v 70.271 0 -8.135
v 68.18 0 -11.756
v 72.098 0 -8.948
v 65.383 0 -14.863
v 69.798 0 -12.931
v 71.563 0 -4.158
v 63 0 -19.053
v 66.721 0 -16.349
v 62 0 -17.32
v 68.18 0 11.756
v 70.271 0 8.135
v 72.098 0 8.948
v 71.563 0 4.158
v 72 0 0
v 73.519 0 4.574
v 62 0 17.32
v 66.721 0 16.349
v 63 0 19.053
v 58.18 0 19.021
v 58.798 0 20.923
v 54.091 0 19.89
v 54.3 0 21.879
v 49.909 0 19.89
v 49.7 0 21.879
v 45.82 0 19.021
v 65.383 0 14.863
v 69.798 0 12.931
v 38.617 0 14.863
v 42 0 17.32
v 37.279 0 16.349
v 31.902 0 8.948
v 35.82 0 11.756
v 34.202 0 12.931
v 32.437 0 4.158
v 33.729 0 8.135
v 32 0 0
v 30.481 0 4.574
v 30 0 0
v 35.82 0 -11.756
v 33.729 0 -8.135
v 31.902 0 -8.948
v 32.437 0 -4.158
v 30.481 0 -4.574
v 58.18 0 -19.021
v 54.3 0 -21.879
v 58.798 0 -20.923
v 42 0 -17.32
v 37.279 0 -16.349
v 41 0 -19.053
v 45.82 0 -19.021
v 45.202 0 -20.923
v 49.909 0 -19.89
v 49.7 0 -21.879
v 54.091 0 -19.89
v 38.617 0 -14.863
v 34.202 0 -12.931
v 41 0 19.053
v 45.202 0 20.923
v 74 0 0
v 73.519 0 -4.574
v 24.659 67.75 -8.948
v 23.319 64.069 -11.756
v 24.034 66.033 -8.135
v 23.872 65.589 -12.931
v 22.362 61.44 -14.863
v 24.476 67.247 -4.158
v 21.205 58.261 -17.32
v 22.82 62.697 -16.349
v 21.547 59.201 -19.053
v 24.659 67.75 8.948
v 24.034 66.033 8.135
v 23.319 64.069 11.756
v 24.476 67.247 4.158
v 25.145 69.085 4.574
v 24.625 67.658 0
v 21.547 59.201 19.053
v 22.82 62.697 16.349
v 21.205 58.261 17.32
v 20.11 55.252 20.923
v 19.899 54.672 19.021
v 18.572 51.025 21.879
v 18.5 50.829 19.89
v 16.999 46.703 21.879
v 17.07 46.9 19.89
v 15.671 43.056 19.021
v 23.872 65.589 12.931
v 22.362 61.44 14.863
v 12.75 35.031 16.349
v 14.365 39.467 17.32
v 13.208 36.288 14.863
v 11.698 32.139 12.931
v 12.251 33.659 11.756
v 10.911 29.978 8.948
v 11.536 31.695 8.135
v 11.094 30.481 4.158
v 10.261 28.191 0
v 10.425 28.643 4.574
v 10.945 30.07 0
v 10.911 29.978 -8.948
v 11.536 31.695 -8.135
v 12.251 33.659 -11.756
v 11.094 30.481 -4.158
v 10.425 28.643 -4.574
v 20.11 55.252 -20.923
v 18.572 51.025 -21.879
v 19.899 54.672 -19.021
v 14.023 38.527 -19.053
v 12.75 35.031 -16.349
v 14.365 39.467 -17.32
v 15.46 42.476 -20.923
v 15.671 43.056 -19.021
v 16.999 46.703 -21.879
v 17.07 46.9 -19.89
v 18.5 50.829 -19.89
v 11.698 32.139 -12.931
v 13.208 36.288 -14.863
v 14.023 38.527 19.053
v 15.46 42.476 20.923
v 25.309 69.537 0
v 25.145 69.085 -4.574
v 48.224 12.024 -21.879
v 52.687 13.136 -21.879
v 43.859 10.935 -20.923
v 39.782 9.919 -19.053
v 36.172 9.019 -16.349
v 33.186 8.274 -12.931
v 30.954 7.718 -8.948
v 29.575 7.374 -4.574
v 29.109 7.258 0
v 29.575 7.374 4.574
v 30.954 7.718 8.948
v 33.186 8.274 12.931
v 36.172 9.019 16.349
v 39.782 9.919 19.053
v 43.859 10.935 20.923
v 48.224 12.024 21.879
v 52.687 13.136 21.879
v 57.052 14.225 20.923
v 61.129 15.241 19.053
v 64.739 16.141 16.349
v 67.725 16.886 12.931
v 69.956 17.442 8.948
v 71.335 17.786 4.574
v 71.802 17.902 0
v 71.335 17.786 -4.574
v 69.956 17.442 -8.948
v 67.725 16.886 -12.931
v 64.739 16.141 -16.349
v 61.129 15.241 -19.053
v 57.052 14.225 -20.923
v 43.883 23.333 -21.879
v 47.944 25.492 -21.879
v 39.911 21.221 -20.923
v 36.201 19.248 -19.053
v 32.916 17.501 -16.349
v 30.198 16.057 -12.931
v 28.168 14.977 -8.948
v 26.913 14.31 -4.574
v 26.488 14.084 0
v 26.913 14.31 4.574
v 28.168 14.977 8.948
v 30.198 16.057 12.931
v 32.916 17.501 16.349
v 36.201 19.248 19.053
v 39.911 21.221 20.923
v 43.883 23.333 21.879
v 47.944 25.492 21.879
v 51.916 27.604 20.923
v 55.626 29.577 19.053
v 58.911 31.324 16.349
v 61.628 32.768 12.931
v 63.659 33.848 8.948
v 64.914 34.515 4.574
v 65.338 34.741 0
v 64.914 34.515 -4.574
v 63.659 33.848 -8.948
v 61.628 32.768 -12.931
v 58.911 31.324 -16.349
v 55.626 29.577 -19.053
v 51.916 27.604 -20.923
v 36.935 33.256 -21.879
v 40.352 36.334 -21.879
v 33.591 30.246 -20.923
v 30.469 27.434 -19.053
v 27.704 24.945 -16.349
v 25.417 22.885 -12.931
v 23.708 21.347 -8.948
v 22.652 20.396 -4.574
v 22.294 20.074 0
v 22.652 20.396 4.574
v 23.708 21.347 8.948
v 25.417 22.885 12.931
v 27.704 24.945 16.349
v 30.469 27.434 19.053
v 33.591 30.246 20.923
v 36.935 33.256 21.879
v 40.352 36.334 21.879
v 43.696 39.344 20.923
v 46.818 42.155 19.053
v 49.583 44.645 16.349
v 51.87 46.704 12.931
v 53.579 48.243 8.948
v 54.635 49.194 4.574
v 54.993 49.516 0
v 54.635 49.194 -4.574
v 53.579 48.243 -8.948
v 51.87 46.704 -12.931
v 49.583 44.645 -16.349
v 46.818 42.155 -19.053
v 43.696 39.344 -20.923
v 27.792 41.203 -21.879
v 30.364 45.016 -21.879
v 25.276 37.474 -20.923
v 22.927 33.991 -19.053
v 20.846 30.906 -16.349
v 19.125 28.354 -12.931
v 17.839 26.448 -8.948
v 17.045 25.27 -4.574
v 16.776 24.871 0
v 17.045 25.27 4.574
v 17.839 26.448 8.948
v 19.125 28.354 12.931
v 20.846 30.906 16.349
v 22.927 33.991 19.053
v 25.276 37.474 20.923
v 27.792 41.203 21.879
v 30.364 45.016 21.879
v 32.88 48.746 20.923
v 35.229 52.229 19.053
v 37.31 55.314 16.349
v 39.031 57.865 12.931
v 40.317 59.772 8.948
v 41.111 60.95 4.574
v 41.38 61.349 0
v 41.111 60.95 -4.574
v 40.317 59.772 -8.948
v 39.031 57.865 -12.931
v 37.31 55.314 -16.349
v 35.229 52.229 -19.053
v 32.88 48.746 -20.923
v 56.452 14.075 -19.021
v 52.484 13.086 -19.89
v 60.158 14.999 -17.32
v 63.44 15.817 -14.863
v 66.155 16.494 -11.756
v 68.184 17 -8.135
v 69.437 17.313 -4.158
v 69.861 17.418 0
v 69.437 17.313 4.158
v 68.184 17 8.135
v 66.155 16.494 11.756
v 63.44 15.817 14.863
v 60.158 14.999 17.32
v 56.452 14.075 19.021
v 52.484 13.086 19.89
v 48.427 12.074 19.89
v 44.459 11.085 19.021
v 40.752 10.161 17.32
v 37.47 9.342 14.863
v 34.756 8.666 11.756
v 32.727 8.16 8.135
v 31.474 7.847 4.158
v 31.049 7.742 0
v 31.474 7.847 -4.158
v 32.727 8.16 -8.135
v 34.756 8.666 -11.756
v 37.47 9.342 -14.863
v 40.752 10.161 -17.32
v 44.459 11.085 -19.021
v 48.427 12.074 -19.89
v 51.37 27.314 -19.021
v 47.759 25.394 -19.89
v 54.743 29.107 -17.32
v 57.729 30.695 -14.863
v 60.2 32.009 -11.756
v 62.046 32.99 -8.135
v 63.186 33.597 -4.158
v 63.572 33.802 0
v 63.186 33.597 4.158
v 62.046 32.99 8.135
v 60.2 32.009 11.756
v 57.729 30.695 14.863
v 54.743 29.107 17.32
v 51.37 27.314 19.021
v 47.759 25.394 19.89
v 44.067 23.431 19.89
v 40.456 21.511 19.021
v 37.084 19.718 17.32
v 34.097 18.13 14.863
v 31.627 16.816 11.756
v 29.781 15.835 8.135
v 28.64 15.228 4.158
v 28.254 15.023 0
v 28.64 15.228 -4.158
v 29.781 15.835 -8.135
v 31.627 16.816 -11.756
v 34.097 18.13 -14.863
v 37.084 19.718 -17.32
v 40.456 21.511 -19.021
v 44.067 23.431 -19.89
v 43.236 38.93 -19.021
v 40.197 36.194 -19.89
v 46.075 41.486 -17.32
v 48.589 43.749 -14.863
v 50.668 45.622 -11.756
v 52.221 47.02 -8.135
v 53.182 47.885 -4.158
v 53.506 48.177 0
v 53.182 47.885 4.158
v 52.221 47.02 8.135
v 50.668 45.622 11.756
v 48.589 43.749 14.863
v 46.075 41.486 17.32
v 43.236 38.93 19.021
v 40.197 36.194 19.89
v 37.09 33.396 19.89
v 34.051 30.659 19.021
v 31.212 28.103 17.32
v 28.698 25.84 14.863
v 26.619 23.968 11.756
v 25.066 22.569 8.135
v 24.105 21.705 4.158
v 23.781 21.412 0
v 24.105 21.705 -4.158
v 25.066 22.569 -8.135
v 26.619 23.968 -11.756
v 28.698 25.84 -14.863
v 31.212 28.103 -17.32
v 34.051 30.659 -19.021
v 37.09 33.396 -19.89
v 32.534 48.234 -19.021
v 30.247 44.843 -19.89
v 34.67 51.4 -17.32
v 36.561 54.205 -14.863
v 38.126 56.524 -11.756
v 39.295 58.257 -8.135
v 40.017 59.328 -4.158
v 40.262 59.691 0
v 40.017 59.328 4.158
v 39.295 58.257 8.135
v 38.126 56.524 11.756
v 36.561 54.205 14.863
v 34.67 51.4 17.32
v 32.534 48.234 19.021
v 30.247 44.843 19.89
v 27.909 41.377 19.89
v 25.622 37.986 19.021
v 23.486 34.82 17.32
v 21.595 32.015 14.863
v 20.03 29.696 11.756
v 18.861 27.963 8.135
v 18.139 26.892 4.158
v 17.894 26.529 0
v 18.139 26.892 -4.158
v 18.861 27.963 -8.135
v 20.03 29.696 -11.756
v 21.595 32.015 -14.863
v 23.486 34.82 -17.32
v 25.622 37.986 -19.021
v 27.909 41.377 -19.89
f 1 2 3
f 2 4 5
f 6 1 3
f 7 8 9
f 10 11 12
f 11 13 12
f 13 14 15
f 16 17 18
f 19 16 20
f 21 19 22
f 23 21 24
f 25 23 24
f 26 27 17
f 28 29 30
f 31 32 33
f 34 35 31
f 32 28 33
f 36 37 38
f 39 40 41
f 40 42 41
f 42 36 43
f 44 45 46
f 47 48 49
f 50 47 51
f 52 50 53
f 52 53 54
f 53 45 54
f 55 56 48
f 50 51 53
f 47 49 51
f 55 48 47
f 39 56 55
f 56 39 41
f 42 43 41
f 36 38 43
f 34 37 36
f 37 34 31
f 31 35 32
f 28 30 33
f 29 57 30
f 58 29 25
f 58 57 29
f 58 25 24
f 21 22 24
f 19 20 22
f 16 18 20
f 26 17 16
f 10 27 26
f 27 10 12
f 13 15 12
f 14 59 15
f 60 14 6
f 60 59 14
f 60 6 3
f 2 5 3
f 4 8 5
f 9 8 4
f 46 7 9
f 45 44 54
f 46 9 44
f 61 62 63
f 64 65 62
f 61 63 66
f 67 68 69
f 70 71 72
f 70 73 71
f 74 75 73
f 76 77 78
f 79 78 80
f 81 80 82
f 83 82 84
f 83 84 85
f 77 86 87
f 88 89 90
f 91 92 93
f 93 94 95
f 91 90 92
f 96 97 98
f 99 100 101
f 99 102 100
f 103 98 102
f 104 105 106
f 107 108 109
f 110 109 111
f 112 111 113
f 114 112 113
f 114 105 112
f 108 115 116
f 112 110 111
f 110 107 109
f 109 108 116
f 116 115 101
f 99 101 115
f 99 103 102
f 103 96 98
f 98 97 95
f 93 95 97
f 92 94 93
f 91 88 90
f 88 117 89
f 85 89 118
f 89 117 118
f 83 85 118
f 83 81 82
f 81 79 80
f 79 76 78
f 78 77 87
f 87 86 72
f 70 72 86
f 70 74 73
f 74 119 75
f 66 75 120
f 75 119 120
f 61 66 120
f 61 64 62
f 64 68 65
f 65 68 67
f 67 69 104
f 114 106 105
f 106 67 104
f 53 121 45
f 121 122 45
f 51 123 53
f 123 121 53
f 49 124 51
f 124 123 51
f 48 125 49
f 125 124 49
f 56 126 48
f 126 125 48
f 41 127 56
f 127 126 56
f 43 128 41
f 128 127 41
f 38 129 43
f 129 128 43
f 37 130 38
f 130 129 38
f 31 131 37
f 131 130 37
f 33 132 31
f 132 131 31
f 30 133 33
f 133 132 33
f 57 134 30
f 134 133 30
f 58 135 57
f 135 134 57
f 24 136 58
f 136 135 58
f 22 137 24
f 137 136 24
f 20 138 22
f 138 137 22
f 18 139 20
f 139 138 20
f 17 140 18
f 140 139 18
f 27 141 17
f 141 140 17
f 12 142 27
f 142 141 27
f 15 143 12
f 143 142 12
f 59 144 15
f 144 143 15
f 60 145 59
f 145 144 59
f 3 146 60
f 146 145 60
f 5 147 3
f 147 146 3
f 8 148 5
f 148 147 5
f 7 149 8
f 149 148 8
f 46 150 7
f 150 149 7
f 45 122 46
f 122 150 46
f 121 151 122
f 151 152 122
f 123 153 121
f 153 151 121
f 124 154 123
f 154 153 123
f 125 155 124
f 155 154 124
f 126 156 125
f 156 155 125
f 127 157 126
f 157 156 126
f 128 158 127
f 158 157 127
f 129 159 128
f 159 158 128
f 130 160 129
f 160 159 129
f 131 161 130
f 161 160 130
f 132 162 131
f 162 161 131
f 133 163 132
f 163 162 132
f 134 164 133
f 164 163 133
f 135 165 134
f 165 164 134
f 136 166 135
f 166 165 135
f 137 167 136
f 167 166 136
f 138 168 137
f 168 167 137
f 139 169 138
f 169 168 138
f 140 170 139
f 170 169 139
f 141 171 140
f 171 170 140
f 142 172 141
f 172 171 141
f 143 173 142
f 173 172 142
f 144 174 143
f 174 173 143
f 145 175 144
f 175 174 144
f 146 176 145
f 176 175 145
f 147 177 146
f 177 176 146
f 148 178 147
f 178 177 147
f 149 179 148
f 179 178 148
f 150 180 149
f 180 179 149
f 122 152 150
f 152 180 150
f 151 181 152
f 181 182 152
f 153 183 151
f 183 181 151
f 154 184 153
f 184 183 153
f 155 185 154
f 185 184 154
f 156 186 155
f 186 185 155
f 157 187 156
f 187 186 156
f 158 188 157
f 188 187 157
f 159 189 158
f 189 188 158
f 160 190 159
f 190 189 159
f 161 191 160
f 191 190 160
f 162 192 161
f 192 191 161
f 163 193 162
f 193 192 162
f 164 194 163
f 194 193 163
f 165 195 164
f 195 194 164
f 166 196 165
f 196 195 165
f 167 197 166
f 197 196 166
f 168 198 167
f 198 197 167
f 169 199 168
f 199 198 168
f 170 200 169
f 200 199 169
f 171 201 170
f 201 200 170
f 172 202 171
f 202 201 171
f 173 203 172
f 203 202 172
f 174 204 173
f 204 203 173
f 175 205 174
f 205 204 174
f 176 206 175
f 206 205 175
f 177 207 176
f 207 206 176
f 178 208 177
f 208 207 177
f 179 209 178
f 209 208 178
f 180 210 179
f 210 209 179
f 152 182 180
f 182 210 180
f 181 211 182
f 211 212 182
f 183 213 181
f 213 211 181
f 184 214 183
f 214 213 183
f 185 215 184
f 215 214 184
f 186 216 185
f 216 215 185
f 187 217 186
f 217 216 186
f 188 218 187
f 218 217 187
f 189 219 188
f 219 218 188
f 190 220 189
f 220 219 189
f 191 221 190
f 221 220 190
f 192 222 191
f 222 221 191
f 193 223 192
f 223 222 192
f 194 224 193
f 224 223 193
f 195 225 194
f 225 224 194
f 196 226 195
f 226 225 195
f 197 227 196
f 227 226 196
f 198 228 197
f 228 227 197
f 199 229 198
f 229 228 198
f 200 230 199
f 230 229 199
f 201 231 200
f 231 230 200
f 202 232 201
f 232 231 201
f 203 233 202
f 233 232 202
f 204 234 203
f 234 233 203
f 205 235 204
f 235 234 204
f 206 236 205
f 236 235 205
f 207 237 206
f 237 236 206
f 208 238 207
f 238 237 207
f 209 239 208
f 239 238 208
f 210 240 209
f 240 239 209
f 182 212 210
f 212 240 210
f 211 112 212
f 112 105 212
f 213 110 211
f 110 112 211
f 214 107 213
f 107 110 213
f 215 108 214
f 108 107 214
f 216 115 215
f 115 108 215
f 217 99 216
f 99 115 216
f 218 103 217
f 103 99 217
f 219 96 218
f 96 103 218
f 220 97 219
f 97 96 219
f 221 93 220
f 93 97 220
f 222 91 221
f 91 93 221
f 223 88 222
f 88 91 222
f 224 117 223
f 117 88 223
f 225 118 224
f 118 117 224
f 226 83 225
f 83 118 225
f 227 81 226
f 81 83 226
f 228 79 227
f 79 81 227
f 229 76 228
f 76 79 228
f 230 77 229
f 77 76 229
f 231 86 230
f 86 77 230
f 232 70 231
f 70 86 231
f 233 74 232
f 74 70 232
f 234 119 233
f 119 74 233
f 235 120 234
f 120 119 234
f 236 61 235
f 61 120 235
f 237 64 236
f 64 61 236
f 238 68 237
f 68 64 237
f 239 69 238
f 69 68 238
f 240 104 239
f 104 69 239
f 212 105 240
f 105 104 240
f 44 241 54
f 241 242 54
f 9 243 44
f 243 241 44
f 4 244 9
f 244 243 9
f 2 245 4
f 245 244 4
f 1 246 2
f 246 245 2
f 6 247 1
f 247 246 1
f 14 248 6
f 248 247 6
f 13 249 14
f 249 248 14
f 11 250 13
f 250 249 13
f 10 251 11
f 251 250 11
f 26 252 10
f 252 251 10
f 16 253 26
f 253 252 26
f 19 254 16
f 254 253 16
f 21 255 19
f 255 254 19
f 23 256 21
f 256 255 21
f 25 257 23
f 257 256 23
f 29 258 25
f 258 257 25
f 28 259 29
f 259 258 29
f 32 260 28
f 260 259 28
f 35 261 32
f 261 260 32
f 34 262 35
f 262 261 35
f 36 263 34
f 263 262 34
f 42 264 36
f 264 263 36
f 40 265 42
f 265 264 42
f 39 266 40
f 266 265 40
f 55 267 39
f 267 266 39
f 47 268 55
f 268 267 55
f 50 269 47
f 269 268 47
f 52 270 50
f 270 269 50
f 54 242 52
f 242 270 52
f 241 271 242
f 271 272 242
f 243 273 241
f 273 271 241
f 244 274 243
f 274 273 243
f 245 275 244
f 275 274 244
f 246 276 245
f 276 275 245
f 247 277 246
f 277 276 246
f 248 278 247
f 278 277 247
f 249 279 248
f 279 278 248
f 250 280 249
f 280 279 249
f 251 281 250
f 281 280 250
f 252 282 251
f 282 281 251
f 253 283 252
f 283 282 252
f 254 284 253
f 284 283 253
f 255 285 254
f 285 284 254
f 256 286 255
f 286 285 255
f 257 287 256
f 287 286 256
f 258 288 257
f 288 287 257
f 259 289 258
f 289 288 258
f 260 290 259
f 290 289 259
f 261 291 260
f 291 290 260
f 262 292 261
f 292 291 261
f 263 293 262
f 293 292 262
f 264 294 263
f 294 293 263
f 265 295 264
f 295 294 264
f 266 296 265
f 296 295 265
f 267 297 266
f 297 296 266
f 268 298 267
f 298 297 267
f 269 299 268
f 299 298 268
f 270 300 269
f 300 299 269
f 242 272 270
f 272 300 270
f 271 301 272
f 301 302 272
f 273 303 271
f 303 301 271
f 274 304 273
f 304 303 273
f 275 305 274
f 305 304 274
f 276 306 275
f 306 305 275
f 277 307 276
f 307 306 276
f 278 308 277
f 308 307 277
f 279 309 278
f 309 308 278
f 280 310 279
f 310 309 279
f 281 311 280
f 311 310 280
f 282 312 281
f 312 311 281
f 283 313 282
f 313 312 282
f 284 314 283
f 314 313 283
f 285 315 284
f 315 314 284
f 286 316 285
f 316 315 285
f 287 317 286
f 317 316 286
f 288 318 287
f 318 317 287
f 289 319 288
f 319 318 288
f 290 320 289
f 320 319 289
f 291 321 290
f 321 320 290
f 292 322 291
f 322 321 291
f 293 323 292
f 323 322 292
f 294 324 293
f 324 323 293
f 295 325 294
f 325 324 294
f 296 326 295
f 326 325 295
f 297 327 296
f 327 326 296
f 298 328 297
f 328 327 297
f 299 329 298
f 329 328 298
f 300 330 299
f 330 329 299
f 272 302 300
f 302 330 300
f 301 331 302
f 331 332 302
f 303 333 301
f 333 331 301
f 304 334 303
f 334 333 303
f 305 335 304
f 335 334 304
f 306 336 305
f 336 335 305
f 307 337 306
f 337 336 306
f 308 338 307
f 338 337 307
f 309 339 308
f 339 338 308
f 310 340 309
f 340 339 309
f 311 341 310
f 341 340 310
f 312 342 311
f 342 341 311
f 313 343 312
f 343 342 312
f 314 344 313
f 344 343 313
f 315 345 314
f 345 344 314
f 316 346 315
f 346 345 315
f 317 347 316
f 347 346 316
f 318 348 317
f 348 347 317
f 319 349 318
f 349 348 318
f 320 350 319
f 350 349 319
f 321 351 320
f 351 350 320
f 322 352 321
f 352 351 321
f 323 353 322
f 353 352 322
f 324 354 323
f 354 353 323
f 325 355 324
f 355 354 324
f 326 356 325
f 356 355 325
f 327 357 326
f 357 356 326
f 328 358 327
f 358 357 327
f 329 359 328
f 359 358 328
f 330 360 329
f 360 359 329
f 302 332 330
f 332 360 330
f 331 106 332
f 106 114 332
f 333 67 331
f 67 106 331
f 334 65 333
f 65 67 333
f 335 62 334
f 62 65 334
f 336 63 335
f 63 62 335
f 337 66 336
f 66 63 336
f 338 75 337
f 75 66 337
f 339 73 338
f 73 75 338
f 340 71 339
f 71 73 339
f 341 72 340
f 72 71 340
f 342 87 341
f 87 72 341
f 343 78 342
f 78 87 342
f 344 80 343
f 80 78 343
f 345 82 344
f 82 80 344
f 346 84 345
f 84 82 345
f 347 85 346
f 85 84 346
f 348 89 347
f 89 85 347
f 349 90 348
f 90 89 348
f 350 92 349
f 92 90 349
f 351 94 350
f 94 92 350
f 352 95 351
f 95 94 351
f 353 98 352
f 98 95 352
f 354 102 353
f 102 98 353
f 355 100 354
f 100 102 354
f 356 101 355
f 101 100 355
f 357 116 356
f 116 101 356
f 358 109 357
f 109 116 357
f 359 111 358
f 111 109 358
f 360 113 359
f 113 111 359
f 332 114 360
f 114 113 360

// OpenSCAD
module slide_elbow(
    degrees = 90,
    thickness = 2,
    tube_r,
    elbow_r
) {
    rotate_extrude(angle=degrees){
        // rotate(90, [1,0,0])
        translate([(tube_r + thickness + elbow_r),0,0])
        difference() {
            circle(r = tube_r + 2);
            circle(r = tube_r);
        }
    }
}


slide_elbow(
    degrees = 70,
    thickness = 2,
    tube_r = 20,
    elbow_r = 30 
);
